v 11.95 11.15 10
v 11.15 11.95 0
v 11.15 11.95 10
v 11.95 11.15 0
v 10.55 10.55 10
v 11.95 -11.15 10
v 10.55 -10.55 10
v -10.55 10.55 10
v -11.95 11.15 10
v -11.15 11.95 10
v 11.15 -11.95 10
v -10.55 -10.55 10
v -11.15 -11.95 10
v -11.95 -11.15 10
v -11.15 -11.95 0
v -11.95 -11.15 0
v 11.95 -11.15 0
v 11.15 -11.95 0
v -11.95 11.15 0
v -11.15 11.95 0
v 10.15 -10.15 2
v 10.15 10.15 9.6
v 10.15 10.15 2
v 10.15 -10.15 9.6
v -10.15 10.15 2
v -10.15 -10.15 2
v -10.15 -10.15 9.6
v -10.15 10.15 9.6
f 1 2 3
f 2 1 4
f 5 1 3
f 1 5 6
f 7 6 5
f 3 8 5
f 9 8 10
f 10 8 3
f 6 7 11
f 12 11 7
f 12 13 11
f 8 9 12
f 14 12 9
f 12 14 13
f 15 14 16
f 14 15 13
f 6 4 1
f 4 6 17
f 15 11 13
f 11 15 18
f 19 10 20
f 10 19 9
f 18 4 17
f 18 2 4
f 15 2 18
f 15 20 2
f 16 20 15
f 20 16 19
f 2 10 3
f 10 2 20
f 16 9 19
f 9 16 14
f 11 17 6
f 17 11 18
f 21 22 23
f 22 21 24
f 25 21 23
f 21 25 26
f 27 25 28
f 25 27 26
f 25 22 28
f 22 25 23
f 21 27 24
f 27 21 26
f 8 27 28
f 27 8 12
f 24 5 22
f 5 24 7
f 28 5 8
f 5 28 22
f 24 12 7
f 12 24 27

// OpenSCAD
// Slip-over 2020 end cap for V-slot or T-slot; outer sleeve avoids core/slot
// differences. Print closed face on the bed and open sleeve upward; no supports.
// Units: mm. Nominal clearance is 0.3 mm across the whole rail, not per side.
// Push over a deburred free rail end. For a snug fit reduce fit_clearance.
// V-slot throat is 6.25 mm in the cited drawing; B-type is 6 mm.
// The sleeve fits the 20 mm outer envelope, without entering either slot.
// The cap is a cover, not a structural retainer. Sleeve adds to outside width.
// Sources: https://www.motedis.com/en/Profile-20x20-B-type-slot-6
// https://bitfab.parts/wp-content/uploads/2023/11/2020V-20x20mm-V-Slot-Profile-Drawing-v2.pdf

profile_width = 20; // Extrusion outer width, mm [20:0.1:20]
fit_clearance = 0.3; // Total added cavity width, mm [0.2:0.05:0.4]
wall = 1.8; // Sleeve wall thickness, mm [1.8:0.2:3]
face_thickness = 2; // Closed end thickness, mm [1.2:0.2:4]
overlap_length = 8; // Sleeve engagement over the rail, mm [5:1:15]
outer_chamfer = 0.8; // Outside corner cut, mm [0.4:0.2:0.8]
lead_in = 0.4; // Internal mouth chamfer depth, mm [0.2:0.1:0.4]

// These ranges retain >=1.4 mm even at the diagonal mouth corners.
inside = profile_width+fit_clearance;
outside = inside+2*wall;
height = face_thickness+overlap_length;
half = outside/2;

color("#e4665f") difference() {
    linear_extrude(height=height)
        polygon([[-half+outer_chamfer,-half], [half-outer_chamfer,-half],
                 [half,-half+outer_chamfer], [half,half-outer_chamfer],
                 [half-outer_chamfer,half], [-half+outer_chamfer,half],
                 [-half,half-outer_chamfer], [-half,-half+outer_chamfer]]);
    translate([-inside/2,-inside/2,face_thickness])
        cube([inside,inside,overlap_length+1]);
    // Hull of two thin cubes makes a square 45-degree entry chamfer.
    hull() {
        translate([-inside/2,-inside/2,height-lead_in])
            cube([inside,inside,0.01]);
        translate([-inside/2-lead_in,-inside/2-lead_in,height])
            cube([inside+2*lead_in,inside+2*lead_in,0.01]);
    }
}
